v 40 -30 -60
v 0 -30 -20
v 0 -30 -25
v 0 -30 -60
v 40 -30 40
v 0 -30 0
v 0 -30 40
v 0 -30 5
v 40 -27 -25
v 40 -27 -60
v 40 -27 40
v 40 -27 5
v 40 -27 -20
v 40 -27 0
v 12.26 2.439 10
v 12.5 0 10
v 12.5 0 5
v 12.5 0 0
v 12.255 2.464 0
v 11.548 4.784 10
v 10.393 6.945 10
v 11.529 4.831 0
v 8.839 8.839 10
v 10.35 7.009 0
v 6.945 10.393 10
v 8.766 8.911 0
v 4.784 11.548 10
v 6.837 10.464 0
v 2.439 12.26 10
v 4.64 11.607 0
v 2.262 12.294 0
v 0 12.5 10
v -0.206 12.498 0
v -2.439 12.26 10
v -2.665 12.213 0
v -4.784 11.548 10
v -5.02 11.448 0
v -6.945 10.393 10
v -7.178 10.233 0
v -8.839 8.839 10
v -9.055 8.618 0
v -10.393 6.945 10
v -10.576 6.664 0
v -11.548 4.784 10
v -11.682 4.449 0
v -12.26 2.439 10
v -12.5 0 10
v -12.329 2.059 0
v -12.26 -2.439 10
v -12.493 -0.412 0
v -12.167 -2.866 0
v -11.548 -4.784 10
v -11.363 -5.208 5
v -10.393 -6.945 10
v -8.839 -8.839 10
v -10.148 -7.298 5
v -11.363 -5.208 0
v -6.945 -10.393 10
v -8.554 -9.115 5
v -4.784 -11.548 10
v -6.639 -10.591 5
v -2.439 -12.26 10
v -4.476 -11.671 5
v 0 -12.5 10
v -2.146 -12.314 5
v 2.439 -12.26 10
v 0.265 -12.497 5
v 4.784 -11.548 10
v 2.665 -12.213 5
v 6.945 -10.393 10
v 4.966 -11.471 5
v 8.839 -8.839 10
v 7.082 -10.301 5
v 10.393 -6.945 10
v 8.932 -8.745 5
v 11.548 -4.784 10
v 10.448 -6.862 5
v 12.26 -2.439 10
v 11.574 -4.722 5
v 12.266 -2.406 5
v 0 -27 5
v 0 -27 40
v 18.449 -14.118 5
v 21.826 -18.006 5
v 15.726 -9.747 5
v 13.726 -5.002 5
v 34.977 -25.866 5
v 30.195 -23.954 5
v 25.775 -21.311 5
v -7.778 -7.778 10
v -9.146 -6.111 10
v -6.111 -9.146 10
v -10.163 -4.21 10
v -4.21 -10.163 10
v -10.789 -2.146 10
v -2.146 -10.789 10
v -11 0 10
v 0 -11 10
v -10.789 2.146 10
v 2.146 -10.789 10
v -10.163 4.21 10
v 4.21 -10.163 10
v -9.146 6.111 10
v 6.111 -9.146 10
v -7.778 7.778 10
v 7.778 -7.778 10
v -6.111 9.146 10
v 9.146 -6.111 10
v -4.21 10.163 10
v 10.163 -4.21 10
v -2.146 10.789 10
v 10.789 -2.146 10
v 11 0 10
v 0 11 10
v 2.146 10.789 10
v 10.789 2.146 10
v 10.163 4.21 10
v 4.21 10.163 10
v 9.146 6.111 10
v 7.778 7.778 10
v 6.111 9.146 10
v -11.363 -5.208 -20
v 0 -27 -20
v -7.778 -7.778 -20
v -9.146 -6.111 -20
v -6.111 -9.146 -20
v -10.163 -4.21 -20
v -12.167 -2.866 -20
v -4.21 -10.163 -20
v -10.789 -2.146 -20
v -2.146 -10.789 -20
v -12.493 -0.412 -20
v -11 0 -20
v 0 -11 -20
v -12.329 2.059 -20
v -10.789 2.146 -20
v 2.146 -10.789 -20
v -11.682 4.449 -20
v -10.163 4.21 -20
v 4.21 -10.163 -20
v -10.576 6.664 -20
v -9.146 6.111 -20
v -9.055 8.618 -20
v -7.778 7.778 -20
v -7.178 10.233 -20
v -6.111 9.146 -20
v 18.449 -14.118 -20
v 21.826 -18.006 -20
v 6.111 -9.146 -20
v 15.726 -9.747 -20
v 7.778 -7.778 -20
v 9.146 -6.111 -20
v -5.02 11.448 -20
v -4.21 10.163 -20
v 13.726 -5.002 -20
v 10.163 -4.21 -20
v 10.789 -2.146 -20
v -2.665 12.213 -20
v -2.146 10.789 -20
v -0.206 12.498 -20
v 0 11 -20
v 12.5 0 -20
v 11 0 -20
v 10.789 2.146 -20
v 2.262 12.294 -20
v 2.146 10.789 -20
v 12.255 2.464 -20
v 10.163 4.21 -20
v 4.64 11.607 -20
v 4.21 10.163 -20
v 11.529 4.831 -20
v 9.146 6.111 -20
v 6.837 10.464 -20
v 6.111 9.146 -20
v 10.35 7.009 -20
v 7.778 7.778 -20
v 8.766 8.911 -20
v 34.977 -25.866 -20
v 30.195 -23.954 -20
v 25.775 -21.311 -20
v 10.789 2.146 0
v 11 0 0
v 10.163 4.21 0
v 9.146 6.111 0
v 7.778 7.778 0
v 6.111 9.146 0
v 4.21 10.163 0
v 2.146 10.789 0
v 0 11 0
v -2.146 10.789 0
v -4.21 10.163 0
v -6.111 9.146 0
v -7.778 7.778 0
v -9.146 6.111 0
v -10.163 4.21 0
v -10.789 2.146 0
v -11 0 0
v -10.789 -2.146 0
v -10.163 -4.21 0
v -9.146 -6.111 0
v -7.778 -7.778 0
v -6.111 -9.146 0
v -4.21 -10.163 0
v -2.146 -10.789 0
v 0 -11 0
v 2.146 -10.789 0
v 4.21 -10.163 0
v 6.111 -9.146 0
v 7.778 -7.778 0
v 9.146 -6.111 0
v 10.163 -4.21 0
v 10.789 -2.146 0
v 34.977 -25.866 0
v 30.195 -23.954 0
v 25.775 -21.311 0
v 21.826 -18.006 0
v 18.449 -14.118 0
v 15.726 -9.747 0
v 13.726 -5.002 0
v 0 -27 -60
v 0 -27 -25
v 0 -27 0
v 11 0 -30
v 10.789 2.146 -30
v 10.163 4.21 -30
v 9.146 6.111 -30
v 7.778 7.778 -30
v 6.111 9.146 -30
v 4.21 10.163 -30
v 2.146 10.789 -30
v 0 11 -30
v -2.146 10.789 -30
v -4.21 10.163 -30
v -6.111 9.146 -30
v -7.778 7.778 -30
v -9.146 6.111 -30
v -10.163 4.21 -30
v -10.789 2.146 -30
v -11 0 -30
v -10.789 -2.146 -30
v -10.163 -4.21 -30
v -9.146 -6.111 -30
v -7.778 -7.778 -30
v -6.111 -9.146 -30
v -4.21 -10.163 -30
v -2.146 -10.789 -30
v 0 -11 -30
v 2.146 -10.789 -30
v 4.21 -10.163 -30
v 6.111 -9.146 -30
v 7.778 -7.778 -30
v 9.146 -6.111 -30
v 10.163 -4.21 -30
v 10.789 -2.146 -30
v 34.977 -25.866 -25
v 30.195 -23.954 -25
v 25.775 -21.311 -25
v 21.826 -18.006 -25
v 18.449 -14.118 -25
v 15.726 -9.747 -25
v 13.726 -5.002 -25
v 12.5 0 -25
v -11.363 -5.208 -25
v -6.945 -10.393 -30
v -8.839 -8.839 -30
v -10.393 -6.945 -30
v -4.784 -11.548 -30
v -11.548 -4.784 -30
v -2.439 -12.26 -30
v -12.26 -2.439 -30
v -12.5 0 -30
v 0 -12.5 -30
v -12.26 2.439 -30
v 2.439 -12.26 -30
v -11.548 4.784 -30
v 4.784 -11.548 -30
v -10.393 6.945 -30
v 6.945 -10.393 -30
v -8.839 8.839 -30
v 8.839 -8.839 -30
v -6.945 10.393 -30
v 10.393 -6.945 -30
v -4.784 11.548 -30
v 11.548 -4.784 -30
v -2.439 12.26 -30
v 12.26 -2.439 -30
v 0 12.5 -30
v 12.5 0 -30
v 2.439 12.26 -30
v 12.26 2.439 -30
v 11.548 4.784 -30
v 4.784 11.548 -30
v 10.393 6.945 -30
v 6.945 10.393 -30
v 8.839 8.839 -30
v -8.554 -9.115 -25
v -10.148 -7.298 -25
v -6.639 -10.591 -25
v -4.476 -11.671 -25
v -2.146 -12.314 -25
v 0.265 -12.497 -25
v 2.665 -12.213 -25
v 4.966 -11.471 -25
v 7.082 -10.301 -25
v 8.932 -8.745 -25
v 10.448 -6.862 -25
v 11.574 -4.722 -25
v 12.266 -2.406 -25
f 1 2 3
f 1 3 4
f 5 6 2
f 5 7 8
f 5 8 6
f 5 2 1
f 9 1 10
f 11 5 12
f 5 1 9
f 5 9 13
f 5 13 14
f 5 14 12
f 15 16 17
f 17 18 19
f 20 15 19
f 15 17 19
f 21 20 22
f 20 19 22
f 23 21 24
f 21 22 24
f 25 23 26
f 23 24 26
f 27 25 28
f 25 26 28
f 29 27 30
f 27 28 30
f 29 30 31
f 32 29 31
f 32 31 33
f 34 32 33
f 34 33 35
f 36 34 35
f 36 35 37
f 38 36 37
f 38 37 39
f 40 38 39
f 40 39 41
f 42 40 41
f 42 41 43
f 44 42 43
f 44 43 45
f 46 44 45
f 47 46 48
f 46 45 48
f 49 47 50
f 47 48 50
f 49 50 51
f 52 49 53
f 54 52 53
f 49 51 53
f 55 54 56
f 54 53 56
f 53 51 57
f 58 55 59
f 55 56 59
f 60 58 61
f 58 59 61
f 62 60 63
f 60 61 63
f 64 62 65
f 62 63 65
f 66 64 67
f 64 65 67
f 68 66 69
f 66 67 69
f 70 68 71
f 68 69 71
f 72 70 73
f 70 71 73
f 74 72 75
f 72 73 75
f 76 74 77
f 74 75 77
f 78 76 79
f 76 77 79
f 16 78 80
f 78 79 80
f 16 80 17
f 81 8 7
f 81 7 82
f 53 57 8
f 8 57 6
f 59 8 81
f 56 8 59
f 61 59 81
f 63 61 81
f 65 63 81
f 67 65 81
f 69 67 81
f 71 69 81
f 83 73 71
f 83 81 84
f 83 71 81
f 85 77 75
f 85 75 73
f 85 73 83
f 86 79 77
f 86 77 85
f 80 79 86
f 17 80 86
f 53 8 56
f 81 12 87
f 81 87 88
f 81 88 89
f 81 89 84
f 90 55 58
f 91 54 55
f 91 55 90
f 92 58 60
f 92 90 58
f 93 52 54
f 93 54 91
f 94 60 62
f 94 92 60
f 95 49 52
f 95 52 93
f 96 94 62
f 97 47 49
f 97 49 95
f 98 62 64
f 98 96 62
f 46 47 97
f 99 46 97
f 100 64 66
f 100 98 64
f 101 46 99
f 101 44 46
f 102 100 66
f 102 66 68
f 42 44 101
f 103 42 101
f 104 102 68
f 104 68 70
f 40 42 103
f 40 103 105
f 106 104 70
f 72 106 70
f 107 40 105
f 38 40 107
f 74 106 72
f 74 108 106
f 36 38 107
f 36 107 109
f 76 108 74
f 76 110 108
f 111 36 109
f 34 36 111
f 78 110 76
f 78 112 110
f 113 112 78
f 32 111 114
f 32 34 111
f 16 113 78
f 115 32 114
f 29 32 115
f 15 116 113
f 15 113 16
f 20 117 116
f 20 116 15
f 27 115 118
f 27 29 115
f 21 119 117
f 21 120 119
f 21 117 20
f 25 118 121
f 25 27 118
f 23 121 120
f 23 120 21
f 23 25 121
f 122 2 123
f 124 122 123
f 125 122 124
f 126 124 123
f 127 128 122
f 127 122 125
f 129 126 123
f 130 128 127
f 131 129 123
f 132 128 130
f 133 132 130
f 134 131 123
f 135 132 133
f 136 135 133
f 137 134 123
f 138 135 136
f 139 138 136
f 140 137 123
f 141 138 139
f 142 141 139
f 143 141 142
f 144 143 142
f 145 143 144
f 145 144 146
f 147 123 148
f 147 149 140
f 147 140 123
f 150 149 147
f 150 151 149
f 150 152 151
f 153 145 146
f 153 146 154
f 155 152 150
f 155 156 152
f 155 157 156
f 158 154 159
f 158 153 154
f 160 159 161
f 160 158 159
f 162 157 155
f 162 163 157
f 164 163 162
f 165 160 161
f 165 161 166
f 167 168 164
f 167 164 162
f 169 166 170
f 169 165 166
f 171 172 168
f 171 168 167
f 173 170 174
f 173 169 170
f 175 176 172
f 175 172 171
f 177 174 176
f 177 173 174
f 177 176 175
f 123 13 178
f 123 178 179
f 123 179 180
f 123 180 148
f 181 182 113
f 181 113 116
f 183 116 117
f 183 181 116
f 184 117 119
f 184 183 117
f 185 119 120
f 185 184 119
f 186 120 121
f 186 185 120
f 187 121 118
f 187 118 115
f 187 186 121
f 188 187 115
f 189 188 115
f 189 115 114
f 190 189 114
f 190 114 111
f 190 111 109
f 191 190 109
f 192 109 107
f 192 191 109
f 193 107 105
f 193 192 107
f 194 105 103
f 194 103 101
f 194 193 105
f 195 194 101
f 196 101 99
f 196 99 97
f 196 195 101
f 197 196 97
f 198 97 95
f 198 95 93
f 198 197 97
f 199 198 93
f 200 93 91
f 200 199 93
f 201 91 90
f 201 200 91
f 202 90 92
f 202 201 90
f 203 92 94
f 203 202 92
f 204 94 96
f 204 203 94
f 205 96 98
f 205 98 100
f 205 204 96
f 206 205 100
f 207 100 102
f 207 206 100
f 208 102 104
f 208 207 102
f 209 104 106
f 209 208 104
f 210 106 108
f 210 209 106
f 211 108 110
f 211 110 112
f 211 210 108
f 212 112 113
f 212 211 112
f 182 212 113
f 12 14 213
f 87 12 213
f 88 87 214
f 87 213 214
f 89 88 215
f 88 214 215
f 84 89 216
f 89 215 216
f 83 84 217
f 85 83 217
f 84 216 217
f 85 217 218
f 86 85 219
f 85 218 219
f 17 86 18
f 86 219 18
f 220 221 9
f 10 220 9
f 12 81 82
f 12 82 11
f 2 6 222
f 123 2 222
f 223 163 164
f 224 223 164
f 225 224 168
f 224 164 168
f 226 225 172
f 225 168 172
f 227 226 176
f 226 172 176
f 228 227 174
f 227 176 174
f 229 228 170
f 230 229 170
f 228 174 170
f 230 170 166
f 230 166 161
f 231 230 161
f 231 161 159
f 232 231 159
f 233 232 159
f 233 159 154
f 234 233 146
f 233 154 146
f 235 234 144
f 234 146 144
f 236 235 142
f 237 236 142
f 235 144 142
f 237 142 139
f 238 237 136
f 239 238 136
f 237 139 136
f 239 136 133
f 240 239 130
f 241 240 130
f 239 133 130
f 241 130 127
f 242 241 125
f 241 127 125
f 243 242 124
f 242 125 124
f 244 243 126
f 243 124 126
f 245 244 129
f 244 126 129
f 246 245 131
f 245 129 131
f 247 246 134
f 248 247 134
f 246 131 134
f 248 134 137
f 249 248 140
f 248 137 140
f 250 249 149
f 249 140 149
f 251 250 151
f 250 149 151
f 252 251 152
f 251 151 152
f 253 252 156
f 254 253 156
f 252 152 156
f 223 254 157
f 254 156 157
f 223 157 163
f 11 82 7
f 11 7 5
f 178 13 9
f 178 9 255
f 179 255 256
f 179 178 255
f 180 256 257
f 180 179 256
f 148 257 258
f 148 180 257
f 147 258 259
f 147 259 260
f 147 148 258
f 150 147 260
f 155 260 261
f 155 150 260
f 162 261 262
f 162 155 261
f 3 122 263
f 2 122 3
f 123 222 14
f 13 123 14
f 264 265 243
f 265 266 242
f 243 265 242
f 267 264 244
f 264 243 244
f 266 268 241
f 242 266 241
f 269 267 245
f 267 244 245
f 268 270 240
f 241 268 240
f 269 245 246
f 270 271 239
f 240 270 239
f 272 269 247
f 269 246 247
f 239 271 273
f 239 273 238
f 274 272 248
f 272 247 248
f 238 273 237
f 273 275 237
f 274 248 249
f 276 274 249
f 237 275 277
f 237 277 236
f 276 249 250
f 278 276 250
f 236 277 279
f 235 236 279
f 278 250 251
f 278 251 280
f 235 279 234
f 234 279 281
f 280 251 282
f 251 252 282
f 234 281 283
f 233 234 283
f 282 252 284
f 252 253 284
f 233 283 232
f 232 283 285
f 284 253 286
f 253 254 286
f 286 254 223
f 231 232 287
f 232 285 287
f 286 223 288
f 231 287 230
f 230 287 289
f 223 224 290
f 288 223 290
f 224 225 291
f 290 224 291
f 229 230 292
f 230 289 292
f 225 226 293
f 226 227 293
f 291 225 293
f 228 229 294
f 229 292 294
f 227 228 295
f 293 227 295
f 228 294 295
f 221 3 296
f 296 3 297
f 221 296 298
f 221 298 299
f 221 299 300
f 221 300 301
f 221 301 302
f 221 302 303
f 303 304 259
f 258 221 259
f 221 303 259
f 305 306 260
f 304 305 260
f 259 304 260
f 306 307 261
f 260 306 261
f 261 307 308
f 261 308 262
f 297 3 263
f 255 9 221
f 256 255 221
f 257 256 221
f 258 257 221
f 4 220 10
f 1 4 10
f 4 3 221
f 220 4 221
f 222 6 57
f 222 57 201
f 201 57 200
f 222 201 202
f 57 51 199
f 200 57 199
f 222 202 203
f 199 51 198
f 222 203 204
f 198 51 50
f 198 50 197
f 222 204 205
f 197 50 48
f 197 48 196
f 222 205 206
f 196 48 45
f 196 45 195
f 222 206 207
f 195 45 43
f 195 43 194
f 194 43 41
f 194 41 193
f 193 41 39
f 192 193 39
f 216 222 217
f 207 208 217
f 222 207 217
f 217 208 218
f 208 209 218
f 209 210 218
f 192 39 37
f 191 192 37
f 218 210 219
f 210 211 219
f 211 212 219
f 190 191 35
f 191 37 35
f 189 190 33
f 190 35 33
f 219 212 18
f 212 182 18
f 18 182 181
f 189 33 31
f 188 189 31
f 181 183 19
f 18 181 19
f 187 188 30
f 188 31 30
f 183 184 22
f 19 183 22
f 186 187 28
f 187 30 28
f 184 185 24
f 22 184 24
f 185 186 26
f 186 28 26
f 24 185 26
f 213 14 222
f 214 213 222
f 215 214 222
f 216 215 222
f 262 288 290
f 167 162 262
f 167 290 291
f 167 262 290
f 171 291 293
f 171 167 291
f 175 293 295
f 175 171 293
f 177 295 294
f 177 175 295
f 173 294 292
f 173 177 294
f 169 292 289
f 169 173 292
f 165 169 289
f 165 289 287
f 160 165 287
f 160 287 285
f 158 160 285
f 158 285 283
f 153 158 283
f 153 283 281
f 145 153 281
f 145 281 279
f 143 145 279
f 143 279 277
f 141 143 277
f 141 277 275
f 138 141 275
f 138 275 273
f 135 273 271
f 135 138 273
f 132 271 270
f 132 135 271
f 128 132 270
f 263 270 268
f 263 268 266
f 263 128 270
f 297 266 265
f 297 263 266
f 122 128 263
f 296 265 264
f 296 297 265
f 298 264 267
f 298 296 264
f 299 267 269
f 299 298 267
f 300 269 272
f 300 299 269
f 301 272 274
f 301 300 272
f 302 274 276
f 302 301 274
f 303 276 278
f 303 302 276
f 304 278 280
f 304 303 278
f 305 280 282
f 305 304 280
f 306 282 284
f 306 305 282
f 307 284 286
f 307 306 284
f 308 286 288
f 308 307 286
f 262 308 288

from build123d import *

# Parameters (mm, degrees)
CROQUIS2_R              = 12.5
CROQUIS2_R_2            = 11
SALIENTE_EXTRUIR1_DEPTH = 10
SALIENTE_EXTRUIR2_DEPTH = 5
CROQUIS2_6_W            = 40
CROQUIS2_6_H            = 3
SALIENTE_EXTRUIR3_DEPTH = 40
CROQUIS2_7_W            = 40
CROQUIS2_7_H            = 3
SALIENTE_EXTRUIR4_DEPTH = 20


with BuildPart() as part:
    # Croquis2 → Saliente-Extruir1 (new body)
    with BuildSketch(Plane.XY):
        Circle(CROQUIS2_R)
        Circle(CROQUIS2_R_2, mode=Mode.SUBTRACT)
    extrude(amount=SALIENTE_EXTRUIR1_DEPTH)

    # Croquis2<4> → Saliente-Extruir2 (add)
    with BuildSketch(Plane.XY):
        with BuildLine():
            Line((-11.363241786, -5.208333333), (0, -30))
            Line((0, -30), (0, -27))
            Line((0, -27), (40, -27))
            ThreePointArc((40, -27), (21.826404492, -18.005513943), (12.5, 0))
            ThreePointArc((12.5, 0), (2.665471597, -12.212504295), (-11.363241786, -5.208333333))
        make_face()
    extrude(amount=SALIENTE_EXTRUIR2_DEPTH)

    # Croquis2<6> → Saliente-Extruir3 (add)
    with BuildSketch(Plane.XY):
        with Locations((20, -28.5)):
            Rectangle(CROQUIS2_6_W, CROQUIS2_6_H)
    extrude(amount=SALIENTE_EXTRUIR3_DEPTH)


with BuildPart() as body_2:
    # Simetría2: mirrored copy
    add(part.part.mirror(Plane(origin=(0, 0, -10), x_dir=(1, 0, 0), z_dir=(0, 0, -1))))


with BuildPart() as part_1:
    add(part.part)

    add(body_2.part)  # Saliente-Extruir4 merges body 2
    # Croquis2<7> → Saliente-Extruir4 (add)
    with BuildSketch(Plane.XY):
        with Locations((20, -28.5)):
            Rectangle(CROQUIS2_7_W, CROQUIS2_7_H)
    extrude(amount=-SALIENTE_EXTRUIR4_DEPTH)


solid = part_1.part
